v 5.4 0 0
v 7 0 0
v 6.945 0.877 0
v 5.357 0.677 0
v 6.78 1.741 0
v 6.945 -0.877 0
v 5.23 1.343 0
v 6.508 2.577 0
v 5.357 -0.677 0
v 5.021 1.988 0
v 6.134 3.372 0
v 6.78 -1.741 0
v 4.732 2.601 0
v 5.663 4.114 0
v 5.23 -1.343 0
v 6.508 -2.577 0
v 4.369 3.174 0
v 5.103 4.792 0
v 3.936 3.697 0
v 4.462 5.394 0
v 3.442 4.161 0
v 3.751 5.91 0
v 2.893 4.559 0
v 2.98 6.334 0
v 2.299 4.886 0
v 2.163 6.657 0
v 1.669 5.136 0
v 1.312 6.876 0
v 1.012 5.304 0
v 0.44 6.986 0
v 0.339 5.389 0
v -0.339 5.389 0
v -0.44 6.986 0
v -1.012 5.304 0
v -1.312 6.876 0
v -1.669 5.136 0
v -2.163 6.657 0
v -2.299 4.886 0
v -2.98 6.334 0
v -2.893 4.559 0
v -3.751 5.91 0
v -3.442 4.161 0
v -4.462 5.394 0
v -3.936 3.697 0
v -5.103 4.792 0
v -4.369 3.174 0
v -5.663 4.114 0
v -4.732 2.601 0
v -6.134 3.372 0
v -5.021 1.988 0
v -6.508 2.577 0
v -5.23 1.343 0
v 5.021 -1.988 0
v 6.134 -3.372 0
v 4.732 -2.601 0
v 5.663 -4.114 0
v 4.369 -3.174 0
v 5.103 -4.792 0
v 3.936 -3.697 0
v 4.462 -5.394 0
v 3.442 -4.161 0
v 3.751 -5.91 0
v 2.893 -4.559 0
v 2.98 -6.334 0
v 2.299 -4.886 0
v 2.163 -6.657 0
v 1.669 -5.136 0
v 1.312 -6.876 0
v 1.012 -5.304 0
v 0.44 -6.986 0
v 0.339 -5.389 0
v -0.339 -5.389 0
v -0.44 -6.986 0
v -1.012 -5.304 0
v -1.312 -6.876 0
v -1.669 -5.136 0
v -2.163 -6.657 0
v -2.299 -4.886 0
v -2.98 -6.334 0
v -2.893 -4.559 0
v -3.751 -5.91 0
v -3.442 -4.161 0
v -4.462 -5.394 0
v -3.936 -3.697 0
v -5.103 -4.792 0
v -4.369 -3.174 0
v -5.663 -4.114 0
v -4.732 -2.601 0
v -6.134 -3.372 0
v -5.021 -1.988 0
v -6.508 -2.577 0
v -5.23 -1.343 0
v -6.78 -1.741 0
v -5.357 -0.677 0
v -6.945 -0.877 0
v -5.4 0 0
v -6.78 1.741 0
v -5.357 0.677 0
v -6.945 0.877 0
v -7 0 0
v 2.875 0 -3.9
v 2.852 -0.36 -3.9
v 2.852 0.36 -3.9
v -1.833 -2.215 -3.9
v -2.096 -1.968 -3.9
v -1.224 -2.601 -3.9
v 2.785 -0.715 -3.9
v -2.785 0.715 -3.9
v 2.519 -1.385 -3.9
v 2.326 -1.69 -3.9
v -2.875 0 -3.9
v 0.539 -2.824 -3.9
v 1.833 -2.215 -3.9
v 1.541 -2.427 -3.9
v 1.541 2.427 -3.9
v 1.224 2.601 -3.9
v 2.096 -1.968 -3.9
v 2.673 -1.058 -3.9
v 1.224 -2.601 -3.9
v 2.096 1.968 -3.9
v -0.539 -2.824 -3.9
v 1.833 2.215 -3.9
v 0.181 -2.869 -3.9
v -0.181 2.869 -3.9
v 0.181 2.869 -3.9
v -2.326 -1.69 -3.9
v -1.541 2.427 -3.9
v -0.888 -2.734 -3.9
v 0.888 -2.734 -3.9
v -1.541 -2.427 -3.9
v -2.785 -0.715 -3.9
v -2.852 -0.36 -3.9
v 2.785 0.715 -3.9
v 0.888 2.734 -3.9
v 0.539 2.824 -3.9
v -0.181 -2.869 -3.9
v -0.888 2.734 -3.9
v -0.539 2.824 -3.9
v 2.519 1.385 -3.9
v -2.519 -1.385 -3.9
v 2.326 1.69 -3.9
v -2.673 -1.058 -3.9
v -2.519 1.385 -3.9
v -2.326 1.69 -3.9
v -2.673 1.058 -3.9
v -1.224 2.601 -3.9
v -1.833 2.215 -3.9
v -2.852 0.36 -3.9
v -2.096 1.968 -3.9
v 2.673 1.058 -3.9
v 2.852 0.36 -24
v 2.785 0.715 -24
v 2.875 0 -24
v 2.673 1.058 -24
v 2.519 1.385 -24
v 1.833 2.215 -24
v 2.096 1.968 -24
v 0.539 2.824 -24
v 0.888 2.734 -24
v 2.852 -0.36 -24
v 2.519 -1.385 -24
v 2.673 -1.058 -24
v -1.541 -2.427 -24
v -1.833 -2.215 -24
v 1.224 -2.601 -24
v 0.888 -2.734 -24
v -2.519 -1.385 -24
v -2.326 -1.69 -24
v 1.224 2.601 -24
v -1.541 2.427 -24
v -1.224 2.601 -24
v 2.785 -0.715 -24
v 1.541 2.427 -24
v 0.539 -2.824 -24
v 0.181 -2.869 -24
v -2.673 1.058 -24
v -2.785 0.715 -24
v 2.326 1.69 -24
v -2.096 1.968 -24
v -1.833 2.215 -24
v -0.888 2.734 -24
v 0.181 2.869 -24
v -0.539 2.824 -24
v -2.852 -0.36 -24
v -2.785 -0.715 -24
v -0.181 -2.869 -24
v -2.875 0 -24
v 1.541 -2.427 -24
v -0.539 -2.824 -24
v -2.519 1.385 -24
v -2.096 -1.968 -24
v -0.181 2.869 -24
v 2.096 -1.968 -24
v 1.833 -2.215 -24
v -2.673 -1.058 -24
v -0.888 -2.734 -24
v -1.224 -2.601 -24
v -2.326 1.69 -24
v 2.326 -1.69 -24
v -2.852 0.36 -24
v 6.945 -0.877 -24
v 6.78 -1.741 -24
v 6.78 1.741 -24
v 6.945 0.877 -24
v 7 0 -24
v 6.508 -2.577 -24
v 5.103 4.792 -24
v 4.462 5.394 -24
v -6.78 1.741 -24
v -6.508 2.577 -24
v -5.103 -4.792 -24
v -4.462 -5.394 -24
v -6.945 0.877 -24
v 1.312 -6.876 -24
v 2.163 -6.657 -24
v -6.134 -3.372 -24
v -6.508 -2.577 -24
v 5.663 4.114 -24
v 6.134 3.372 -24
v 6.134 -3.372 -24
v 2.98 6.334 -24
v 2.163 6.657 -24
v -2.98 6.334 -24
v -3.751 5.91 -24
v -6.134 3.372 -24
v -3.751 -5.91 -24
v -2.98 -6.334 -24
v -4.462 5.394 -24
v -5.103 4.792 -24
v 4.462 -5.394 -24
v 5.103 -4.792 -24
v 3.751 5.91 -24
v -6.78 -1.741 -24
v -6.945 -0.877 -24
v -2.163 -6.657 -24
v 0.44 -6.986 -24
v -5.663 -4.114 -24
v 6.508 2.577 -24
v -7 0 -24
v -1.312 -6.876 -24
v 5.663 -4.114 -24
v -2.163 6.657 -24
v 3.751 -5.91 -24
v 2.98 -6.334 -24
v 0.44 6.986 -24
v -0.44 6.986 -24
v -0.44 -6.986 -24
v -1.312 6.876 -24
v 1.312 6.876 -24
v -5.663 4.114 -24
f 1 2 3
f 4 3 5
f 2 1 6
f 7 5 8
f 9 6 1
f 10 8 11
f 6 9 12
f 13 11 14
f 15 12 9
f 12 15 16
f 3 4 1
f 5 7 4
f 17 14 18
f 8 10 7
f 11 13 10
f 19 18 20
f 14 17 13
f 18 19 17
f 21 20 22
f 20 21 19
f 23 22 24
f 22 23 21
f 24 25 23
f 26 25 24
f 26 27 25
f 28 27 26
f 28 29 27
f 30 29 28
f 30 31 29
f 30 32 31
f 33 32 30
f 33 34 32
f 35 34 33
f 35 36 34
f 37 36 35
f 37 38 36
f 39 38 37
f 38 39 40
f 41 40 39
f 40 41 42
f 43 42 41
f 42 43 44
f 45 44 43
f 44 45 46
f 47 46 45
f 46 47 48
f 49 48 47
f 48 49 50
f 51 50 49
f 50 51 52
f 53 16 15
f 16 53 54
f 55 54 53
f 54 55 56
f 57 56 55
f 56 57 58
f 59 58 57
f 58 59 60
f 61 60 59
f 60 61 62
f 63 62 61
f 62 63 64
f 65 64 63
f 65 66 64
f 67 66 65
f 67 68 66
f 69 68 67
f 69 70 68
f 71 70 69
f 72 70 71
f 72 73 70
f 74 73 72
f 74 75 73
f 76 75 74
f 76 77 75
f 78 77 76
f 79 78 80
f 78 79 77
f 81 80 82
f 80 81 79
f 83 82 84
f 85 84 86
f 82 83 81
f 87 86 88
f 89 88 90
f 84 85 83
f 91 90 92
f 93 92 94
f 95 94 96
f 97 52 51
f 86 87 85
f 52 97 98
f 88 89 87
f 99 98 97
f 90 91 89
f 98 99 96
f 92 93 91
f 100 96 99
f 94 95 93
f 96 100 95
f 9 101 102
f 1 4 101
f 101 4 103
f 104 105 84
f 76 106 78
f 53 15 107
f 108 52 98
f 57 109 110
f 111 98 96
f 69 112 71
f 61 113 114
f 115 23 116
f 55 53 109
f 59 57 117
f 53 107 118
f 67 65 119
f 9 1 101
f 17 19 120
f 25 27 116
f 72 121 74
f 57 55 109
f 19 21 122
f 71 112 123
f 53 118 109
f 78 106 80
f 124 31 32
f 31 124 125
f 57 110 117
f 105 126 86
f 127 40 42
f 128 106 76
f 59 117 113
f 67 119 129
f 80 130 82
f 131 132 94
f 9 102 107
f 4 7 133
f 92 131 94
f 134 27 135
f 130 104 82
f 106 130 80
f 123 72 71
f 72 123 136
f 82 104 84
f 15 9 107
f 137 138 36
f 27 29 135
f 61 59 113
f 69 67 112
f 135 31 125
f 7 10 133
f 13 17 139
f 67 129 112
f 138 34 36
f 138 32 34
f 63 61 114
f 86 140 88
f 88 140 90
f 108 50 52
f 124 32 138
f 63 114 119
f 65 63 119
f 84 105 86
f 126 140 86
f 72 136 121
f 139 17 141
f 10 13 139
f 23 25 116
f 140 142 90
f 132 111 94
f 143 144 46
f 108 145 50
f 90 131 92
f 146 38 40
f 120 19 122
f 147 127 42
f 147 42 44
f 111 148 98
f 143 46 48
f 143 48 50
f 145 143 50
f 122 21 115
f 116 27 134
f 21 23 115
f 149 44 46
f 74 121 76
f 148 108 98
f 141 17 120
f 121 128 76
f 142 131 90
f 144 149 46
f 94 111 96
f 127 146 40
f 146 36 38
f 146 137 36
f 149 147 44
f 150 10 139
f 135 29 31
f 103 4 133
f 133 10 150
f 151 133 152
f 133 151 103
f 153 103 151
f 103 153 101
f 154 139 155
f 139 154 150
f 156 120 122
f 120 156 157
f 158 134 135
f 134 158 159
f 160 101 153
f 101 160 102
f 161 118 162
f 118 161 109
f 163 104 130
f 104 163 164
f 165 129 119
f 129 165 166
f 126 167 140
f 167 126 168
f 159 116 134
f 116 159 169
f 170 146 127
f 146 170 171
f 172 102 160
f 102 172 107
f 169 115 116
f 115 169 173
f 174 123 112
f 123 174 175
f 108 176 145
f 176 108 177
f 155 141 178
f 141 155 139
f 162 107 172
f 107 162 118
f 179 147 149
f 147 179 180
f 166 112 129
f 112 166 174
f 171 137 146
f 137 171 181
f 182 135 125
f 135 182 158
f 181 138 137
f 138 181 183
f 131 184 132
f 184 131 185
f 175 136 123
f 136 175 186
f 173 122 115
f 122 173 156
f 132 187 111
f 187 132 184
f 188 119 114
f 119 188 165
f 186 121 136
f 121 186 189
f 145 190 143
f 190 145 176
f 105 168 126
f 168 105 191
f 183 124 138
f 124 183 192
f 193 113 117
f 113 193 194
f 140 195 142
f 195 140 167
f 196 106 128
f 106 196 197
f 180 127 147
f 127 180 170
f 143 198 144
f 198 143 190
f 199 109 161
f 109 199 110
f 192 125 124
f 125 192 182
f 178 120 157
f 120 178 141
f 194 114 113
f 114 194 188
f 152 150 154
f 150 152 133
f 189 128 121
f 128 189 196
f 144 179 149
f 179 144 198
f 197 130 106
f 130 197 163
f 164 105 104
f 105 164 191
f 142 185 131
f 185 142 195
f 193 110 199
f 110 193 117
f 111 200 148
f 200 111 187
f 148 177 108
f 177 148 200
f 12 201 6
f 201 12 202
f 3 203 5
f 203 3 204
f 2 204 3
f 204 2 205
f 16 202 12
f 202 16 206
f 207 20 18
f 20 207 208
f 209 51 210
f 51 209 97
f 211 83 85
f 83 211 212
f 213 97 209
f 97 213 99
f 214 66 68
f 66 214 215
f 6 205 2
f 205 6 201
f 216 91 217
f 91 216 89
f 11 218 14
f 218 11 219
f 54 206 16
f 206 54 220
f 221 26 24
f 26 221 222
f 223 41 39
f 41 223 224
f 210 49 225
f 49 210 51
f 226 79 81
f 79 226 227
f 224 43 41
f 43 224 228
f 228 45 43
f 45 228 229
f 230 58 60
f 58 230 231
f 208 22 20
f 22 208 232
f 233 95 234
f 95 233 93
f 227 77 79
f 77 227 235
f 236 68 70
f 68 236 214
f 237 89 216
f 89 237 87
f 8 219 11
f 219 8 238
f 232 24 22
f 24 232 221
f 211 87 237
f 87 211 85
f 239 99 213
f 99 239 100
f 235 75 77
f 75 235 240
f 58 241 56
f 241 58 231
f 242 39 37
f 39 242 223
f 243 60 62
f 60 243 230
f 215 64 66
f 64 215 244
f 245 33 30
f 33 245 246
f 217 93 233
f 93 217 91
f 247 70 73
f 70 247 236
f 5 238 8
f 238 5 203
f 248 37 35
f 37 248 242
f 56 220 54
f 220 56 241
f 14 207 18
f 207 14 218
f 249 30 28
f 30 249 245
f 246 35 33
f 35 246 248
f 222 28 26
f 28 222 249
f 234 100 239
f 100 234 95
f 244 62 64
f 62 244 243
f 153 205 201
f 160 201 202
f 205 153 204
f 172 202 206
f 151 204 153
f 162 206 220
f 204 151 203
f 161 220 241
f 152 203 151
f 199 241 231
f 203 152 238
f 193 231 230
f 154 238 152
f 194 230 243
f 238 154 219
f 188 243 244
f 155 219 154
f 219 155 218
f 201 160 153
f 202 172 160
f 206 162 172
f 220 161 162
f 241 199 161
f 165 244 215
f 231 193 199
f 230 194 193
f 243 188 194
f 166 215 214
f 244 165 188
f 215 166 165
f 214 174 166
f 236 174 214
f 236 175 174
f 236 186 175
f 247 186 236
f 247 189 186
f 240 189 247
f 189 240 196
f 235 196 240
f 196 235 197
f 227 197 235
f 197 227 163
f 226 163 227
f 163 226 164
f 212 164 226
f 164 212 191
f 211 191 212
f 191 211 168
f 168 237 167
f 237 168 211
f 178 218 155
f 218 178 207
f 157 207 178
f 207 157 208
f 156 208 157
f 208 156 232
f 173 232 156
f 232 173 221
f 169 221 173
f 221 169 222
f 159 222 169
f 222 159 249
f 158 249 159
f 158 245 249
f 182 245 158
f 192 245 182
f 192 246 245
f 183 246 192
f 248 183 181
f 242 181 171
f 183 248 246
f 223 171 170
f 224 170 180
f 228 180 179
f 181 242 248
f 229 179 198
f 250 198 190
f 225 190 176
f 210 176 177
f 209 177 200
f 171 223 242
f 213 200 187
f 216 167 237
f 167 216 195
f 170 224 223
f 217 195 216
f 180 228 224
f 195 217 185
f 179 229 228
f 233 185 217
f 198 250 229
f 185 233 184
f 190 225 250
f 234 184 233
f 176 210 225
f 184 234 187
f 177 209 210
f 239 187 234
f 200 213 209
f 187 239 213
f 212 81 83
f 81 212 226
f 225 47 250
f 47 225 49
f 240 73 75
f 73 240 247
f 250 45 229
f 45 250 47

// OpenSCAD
$fn = 50;

difference() {
	union() {
		translate(v = [0, 0, -24.0]) {
			cylinder(h = 24, r = 7.0);
		}
	}
	union() {
		translate(v = [0, 0, 0]) {
			rotate(a = [0, 0, 0]) {
				difference() {
					union() {
						translate(v = [0, 0, -27.0]) {
							cylinder(h = 27, r = 2.6);
						}
						translate(v = [0, 0, -3.9]) {
							cylinder(h = 3.9, r1 = 2.875, r2 = 5.4);
						}
						translate(v = [0, 0, -27.0]) {
							cylinder(h = 27, r = 2.875);
						}
						translate(v = [0, 0, -27.0]) {
							cylinder(h = 27, r = 2.6);
						}
					}
					union();
				}
			}
		}
	}
}
